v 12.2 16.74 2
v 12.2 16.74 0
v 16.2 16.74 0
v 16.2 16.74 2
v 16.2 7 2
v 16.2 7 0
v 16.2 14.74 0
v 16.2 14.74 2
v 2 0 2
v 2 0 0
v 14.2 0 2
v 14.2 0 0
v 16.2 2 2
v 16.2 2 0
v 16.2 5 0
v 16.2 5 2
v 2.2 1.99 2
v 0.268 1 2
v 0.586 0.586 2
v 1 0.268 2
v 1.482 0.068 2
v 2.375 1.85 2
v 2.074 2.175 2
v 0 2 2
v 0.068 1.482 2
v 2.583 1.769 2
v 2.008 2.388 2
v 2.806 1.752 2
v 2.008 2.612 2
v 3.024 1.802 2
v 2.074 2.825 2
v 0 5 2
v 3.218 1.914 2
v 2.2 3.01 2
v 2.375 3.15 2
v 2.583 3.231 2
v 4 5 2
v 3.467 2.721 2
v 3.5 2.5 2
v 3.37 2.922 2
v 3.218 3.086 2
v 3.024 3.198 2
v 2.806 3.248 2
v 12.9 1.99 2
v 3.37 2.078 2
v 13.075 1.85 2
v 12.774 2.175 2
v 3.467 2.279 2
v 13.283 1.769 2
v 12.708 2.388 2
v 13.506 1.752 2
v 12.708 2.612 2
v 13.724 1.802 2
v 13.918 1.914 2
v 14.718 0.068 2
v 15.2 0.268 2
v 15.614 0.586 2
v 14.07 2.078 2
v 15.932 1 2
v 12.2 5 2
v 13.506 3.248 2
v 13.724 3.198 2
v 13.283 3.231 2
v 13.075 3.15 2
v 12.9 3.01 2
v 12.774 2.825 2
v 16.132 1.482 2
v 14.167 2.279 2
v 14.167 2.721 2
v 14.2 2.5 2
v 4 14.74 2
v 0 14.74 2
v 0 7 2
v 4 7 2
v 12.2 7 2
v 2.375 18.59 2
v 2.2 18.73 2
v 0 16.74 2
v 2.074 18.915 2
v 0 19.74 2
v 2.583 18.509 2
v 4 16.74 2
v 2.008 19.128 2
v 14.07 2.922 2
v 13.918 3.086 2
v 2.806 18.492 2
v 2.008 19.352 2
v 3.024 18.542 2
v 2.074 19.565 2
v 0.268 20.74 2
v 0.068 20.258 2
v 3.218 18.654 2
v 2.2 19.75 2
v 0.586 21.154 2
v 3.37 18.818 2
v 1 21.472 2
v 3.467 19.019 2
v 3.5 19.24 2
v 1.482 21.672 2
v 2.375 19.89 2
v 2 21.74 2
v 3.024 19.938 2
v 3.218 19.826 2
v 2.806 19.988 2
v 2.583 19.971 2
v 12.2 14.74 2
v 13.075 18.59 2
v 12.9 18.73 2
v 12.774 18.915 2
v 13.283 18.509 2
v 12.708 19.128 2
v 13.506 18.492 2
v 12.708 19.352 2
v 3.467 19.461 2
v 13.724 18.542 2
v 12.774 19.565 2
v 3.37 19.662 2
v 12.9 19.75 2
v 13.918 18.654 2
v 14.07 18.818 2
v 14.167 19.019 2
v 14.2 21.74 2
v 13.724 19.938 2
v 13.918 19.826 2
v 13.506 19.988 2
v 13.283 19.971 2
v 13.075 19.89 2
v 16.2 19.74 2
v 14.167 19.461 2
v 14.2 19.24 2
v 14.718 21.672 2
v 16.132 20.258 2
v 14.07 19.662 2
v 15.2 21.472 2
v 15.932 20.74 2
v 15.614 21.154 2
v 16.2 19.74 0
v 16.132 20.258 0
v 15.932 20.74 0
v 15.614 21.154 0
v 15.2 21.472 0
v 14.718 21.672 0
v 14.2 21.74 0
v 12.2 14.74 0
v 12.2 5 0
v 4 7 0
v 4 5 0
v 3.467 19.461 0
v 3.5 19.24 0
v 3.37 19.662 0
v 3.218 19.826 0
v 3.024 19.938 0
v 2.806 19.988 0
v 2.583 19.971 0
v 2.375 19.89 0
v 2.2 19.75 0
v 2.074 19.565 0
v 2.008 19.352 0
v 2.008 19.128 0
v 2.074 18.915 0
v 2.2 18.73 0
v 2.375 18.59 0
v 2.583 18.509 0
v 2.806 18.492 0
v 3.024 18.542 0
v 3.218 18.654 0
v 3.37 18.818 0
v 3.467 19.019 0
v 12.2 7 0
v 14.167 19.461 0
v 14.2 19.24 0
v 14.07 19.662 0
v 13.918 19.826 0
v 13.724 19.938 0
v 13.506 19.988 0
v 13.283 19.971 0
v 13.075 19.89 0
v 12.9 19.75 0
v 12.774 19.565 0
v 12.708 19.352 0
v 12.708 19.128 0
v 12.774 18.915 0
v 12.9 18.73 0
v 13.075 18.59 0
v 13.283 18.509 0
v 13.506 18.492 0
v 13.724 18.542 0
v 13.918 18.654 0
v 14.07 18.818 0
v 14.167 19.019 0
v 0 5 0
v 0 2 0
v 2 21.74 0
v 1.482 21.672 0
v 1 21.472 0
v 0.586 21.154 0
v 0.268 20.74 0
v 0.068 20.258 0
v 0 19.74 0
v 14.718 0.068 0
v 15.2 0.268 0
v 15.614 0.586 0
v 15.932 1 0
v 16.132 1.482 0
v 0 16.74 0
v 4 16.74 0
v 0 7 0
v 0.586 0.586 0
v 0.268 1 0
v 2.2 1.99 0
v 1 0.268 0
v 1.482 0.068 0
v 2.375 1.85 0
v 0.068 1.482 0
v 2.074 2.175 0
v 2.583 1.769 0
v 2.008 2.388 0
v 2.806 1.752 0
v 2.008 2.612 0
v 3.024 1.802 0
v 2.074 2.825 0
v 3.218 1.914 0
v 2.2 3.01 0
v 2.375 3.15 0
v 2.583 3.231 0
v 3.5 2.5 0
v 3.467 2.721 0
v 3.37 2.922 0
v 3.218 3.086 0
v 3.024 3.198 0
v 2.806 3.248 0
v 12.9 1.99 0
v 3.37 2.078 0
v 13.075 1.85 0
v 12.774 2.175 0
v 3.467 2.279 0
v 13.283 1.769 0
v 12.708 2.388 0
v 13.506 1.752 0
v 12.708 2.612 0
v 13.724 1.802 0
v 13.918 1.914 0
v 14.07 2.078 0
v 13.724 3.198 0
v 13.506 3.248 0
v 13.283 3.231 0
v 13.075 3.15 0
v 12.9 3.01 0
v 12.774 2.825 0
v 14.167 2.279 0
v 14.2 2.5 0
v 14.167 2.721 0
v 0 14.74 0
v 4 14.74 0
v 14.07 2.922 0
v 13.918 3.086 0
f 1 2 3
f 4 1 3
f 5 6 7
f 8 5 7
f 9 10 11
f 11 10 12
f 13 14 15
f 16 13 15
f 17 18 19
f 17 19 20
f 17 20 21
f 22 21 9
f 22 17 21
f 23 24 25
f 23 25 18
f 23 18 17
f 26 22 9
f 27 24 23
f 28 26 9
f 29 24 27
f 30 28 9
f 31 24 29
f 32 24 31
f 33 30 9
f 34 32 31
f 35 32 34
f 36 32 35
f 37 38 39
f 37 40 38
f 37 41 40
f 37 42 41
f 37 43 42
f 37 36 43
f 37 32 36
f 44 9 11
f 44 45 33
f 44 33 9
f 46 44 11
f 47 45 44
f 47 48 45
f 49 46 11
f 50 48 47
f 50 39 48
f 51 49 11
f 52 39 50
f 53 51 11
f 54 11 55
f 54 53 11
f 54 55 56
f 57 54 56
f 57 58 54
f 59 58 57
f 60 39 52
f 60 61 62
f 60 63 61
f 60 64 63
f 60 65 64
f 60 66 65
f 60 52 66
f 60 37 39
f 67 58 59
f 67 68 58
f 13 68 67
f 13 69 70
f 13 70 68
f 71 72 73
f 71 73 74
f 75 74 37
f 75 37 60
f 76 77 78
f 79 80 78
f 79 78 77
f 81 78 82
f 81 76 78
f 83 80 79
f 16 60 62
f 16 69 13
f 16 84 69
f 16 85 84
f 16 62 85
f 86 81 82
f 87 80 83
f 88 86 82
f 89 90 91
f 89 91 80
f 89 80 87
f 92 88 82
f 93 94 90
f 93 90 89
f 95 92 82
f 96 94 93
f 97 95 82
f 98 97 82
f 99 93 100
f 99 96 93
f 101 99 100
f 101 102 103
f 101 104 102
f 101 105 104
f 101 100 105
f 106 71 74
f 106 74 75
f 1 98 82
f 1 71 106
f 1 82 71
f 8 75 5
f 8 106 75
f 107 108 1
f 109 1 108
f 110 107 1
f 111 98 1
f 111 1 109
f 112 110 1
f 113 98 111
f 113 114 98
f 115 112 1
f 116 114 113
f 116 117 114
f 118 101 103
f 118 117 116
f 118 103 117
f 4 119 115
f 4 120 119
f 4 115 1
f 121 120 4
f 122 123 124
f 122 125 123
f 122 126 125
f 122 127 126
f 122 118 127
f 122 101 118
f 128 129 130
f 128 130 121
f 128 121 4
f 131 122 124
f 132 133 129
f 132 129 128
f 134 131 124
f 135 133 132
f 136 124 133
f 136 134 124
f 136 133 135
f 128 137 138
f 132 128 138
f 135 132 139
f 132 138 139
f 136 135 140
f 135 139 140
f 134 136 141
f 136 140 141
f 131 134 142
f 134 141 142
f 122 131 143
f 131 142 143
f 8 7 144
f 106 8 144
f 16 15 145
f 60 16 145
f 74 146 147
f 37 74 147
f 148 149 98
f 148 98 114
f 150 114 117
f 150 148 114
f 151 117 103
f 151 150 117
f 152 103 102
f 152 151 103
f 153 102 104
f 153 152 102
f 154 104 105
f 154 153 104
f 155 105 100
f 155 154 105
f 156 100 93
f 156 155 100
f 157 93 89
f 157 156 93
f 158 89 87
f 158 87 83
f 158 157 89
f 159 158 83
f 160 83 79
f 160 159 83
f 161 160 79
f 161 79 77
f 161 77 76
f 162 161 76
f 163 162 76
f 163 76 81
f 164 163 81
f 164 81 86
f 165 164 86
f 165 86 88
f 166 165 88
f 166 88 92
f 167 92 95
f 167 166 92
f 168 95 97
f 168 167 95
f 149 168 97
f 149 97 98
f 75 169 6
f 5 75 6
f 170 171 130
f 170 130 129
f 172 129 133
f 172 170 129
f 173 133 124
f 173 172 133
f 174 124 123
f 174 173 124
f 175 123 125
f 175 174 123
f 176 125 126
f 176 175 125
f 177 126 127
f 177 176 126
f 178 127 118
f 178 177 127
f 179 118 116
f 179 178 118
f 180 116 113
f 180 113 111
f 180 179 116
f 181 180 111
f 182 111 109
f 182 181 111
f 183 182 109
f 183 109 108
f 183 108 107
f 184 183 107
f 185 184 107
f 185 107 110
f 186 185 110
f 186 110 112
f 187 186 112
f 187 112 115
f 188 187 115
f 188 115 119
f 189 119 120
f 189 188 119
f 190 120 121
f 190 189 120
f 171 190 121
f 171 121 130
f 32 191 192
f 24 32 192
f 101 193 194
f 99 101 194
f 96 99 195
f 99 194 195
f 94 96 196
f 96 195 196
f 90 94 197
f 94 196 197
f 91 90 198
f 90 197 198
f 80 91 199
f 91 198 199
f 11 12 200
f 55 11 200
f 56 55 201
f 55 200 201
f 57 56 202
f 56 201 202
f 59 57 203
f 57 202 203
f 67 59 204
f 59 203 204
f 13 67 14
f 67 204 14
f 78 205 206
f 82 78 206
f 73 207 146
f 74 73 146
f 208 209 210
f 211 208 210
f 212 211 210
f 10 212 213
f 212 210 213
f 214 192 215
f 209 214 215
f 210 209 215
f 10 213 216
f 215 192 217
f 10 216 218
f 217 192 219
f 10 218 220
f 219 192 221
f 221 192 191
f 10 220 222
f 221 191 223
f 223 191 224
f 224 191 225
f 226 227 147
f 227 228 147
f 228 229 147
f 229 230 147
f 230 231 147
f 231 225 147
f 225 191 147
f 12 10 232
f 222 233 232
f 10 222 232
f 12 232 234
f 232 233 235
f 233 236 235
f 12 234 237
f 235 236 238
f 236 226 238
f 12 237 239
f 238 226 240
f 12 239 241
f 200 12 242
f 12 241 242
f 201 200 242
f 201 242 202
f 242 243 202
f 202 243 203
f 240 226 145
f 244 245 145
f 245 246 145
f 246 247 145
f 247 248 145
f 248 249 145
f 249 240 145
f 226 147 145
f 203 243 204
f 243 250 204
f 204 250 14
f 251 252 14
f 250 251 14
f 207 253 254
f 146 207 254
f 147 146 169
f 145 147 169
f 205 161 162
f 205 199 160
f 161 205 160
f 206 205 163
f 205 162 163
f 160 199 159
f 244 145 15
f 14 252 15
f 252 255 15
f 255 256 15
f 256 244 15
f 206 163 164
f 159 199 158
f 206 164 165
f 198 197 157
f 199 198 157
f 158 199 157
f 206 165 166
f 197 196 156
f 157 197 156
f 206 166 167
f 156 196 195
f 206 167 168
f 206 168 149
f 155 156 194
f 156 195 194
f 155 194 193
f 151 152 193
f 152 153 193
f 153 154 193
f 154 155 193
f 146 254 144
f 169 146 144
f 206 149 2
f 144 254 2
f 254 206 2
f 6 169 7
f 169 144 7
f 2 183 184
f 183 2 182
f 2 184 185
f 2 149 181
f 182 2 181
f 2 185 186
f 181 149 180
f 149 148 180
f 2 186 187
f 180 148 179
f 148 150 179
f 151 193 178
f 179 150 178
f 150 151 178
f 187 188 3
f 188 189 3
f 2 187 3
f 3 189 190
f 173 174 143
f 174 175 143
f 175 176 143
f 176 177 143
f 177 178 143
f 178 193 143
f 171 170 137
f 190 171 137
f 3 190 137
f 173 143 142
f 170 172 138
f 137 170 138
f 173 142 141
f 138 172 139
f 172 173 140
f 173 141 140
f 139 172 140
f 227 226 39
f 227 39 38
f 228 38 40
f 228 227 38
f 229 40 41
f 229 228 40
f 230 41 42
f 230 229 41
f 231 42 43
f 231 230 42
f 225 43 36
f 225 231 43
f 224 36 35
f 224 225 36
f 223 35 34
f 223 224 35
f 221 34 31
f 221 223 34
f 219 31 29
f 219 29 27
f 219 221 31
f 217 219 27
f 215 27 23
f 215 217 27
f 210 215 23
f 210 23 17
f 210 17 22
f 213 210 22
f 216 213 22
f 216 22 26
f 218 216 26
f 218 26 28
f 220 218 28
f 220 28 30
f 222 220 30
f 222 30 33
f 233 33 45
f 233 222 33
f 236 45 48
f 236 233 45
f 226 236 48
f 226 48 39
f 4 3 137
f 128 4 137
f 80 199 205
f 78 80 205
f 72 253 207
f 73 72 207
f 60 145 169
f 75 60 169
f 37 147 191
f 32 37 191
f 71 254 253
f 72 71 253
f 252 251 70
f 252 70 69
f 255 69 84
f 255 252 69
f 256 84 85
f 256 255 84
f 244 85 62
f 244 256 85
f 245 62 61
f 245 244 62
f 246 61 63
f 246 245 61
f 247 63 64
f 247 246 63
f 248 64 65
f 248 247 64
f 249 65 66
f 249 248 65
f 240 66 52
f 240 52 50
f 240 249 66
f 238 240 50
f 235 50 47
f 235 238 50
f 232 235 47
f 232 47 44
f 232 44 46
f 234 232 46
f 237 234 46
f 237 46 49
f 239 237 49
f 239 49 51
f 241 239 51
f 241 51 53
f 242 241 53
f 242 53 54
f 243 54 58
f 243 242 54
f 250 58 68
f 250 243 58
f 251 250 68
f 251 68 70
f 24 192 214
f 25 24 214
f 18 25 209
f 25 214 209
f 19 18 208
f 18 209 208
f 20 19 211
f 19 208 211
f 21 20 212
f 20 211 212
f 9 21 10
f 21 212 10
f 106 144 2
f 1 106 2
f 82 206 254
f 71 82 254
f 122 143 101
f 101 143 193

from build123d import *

# Parameters (mm, degrees)
SKETCH1_R           = 0.75
BOSS_EXTRUDE1_DEPTH = 2


with BuildPart() as part:
    # Sketch1 → Boss-Extrude1 (new body)
    with BuildSketch(Plane.XY):
        with BuildLine():
            Line((0, 14.74), (0, 7))
            Line((0, 7), (4, 7))
            Line((4, 7), (4, 5))
            Line((4, 5), (0, 5))
            Line((0, 5), (0, 2))
            ThreePointArc((0, 2), (0.585786438, 0.585786438), (2, 0))
            Line((2, 0), (14.2, 0))
            ThreePointArc((14.2, 0), (15.614213562, 0.585786438), (16.2, 2))
            Line((16.2, 2), (16.2, 5))
            Line((16.2, 5), (12.2, 5))
            Line((12.2, 5), (12.2, 7))
            Line((12.2, 7), (16.2, 7))
            Line((16.2, 7), (16.2, 14.74))
            Line((16.2, 14.74), (12.2, 14.74))
            Line((12.2, 14.74), (12.2, 16.74))
            Line((12.2, 16.74), (16.2, 16.74))
            Line((16.2, 16.74), (16.2, 19.74))
            ThreePointArc((16.2, 19.74), (15.614213562, 21.154213562), (14.2, 21.74))
            Line((14.2, 21.74), (2, 21.74))
            ThreePointArc((2, 21.74), (0.585786438, 21.154213562), (0, 19.74))
            Line((0, 19.74), (0, 16.74))
            Line((0, 16.74), (4, 16.74))
            Line((4, 16.74), (4, 14.74))
            Line((4, 14.74), (0, 14.74))
        make_face()
        with Locations((13.45, 2.5)):
            Circle(SKETCH1_R, mode=Mode.SUBTRACT)
        with Locations((2.75, 19.24)):
            Circle(SKETCH1_R, mode=Mode.SUBTRACT)
        with Locations((2.75, 2.5)):
            Circle(SKETCH1_R, mode=Mode.SUBTRACT)
        with Locations((13.45, 19.24)):
            Circle(SKETCH1_R, mode=Mode.SUBTRACT)
    extrude(amount=BOSS_EXTRUDE1_DEPTH)


solid = part.part
